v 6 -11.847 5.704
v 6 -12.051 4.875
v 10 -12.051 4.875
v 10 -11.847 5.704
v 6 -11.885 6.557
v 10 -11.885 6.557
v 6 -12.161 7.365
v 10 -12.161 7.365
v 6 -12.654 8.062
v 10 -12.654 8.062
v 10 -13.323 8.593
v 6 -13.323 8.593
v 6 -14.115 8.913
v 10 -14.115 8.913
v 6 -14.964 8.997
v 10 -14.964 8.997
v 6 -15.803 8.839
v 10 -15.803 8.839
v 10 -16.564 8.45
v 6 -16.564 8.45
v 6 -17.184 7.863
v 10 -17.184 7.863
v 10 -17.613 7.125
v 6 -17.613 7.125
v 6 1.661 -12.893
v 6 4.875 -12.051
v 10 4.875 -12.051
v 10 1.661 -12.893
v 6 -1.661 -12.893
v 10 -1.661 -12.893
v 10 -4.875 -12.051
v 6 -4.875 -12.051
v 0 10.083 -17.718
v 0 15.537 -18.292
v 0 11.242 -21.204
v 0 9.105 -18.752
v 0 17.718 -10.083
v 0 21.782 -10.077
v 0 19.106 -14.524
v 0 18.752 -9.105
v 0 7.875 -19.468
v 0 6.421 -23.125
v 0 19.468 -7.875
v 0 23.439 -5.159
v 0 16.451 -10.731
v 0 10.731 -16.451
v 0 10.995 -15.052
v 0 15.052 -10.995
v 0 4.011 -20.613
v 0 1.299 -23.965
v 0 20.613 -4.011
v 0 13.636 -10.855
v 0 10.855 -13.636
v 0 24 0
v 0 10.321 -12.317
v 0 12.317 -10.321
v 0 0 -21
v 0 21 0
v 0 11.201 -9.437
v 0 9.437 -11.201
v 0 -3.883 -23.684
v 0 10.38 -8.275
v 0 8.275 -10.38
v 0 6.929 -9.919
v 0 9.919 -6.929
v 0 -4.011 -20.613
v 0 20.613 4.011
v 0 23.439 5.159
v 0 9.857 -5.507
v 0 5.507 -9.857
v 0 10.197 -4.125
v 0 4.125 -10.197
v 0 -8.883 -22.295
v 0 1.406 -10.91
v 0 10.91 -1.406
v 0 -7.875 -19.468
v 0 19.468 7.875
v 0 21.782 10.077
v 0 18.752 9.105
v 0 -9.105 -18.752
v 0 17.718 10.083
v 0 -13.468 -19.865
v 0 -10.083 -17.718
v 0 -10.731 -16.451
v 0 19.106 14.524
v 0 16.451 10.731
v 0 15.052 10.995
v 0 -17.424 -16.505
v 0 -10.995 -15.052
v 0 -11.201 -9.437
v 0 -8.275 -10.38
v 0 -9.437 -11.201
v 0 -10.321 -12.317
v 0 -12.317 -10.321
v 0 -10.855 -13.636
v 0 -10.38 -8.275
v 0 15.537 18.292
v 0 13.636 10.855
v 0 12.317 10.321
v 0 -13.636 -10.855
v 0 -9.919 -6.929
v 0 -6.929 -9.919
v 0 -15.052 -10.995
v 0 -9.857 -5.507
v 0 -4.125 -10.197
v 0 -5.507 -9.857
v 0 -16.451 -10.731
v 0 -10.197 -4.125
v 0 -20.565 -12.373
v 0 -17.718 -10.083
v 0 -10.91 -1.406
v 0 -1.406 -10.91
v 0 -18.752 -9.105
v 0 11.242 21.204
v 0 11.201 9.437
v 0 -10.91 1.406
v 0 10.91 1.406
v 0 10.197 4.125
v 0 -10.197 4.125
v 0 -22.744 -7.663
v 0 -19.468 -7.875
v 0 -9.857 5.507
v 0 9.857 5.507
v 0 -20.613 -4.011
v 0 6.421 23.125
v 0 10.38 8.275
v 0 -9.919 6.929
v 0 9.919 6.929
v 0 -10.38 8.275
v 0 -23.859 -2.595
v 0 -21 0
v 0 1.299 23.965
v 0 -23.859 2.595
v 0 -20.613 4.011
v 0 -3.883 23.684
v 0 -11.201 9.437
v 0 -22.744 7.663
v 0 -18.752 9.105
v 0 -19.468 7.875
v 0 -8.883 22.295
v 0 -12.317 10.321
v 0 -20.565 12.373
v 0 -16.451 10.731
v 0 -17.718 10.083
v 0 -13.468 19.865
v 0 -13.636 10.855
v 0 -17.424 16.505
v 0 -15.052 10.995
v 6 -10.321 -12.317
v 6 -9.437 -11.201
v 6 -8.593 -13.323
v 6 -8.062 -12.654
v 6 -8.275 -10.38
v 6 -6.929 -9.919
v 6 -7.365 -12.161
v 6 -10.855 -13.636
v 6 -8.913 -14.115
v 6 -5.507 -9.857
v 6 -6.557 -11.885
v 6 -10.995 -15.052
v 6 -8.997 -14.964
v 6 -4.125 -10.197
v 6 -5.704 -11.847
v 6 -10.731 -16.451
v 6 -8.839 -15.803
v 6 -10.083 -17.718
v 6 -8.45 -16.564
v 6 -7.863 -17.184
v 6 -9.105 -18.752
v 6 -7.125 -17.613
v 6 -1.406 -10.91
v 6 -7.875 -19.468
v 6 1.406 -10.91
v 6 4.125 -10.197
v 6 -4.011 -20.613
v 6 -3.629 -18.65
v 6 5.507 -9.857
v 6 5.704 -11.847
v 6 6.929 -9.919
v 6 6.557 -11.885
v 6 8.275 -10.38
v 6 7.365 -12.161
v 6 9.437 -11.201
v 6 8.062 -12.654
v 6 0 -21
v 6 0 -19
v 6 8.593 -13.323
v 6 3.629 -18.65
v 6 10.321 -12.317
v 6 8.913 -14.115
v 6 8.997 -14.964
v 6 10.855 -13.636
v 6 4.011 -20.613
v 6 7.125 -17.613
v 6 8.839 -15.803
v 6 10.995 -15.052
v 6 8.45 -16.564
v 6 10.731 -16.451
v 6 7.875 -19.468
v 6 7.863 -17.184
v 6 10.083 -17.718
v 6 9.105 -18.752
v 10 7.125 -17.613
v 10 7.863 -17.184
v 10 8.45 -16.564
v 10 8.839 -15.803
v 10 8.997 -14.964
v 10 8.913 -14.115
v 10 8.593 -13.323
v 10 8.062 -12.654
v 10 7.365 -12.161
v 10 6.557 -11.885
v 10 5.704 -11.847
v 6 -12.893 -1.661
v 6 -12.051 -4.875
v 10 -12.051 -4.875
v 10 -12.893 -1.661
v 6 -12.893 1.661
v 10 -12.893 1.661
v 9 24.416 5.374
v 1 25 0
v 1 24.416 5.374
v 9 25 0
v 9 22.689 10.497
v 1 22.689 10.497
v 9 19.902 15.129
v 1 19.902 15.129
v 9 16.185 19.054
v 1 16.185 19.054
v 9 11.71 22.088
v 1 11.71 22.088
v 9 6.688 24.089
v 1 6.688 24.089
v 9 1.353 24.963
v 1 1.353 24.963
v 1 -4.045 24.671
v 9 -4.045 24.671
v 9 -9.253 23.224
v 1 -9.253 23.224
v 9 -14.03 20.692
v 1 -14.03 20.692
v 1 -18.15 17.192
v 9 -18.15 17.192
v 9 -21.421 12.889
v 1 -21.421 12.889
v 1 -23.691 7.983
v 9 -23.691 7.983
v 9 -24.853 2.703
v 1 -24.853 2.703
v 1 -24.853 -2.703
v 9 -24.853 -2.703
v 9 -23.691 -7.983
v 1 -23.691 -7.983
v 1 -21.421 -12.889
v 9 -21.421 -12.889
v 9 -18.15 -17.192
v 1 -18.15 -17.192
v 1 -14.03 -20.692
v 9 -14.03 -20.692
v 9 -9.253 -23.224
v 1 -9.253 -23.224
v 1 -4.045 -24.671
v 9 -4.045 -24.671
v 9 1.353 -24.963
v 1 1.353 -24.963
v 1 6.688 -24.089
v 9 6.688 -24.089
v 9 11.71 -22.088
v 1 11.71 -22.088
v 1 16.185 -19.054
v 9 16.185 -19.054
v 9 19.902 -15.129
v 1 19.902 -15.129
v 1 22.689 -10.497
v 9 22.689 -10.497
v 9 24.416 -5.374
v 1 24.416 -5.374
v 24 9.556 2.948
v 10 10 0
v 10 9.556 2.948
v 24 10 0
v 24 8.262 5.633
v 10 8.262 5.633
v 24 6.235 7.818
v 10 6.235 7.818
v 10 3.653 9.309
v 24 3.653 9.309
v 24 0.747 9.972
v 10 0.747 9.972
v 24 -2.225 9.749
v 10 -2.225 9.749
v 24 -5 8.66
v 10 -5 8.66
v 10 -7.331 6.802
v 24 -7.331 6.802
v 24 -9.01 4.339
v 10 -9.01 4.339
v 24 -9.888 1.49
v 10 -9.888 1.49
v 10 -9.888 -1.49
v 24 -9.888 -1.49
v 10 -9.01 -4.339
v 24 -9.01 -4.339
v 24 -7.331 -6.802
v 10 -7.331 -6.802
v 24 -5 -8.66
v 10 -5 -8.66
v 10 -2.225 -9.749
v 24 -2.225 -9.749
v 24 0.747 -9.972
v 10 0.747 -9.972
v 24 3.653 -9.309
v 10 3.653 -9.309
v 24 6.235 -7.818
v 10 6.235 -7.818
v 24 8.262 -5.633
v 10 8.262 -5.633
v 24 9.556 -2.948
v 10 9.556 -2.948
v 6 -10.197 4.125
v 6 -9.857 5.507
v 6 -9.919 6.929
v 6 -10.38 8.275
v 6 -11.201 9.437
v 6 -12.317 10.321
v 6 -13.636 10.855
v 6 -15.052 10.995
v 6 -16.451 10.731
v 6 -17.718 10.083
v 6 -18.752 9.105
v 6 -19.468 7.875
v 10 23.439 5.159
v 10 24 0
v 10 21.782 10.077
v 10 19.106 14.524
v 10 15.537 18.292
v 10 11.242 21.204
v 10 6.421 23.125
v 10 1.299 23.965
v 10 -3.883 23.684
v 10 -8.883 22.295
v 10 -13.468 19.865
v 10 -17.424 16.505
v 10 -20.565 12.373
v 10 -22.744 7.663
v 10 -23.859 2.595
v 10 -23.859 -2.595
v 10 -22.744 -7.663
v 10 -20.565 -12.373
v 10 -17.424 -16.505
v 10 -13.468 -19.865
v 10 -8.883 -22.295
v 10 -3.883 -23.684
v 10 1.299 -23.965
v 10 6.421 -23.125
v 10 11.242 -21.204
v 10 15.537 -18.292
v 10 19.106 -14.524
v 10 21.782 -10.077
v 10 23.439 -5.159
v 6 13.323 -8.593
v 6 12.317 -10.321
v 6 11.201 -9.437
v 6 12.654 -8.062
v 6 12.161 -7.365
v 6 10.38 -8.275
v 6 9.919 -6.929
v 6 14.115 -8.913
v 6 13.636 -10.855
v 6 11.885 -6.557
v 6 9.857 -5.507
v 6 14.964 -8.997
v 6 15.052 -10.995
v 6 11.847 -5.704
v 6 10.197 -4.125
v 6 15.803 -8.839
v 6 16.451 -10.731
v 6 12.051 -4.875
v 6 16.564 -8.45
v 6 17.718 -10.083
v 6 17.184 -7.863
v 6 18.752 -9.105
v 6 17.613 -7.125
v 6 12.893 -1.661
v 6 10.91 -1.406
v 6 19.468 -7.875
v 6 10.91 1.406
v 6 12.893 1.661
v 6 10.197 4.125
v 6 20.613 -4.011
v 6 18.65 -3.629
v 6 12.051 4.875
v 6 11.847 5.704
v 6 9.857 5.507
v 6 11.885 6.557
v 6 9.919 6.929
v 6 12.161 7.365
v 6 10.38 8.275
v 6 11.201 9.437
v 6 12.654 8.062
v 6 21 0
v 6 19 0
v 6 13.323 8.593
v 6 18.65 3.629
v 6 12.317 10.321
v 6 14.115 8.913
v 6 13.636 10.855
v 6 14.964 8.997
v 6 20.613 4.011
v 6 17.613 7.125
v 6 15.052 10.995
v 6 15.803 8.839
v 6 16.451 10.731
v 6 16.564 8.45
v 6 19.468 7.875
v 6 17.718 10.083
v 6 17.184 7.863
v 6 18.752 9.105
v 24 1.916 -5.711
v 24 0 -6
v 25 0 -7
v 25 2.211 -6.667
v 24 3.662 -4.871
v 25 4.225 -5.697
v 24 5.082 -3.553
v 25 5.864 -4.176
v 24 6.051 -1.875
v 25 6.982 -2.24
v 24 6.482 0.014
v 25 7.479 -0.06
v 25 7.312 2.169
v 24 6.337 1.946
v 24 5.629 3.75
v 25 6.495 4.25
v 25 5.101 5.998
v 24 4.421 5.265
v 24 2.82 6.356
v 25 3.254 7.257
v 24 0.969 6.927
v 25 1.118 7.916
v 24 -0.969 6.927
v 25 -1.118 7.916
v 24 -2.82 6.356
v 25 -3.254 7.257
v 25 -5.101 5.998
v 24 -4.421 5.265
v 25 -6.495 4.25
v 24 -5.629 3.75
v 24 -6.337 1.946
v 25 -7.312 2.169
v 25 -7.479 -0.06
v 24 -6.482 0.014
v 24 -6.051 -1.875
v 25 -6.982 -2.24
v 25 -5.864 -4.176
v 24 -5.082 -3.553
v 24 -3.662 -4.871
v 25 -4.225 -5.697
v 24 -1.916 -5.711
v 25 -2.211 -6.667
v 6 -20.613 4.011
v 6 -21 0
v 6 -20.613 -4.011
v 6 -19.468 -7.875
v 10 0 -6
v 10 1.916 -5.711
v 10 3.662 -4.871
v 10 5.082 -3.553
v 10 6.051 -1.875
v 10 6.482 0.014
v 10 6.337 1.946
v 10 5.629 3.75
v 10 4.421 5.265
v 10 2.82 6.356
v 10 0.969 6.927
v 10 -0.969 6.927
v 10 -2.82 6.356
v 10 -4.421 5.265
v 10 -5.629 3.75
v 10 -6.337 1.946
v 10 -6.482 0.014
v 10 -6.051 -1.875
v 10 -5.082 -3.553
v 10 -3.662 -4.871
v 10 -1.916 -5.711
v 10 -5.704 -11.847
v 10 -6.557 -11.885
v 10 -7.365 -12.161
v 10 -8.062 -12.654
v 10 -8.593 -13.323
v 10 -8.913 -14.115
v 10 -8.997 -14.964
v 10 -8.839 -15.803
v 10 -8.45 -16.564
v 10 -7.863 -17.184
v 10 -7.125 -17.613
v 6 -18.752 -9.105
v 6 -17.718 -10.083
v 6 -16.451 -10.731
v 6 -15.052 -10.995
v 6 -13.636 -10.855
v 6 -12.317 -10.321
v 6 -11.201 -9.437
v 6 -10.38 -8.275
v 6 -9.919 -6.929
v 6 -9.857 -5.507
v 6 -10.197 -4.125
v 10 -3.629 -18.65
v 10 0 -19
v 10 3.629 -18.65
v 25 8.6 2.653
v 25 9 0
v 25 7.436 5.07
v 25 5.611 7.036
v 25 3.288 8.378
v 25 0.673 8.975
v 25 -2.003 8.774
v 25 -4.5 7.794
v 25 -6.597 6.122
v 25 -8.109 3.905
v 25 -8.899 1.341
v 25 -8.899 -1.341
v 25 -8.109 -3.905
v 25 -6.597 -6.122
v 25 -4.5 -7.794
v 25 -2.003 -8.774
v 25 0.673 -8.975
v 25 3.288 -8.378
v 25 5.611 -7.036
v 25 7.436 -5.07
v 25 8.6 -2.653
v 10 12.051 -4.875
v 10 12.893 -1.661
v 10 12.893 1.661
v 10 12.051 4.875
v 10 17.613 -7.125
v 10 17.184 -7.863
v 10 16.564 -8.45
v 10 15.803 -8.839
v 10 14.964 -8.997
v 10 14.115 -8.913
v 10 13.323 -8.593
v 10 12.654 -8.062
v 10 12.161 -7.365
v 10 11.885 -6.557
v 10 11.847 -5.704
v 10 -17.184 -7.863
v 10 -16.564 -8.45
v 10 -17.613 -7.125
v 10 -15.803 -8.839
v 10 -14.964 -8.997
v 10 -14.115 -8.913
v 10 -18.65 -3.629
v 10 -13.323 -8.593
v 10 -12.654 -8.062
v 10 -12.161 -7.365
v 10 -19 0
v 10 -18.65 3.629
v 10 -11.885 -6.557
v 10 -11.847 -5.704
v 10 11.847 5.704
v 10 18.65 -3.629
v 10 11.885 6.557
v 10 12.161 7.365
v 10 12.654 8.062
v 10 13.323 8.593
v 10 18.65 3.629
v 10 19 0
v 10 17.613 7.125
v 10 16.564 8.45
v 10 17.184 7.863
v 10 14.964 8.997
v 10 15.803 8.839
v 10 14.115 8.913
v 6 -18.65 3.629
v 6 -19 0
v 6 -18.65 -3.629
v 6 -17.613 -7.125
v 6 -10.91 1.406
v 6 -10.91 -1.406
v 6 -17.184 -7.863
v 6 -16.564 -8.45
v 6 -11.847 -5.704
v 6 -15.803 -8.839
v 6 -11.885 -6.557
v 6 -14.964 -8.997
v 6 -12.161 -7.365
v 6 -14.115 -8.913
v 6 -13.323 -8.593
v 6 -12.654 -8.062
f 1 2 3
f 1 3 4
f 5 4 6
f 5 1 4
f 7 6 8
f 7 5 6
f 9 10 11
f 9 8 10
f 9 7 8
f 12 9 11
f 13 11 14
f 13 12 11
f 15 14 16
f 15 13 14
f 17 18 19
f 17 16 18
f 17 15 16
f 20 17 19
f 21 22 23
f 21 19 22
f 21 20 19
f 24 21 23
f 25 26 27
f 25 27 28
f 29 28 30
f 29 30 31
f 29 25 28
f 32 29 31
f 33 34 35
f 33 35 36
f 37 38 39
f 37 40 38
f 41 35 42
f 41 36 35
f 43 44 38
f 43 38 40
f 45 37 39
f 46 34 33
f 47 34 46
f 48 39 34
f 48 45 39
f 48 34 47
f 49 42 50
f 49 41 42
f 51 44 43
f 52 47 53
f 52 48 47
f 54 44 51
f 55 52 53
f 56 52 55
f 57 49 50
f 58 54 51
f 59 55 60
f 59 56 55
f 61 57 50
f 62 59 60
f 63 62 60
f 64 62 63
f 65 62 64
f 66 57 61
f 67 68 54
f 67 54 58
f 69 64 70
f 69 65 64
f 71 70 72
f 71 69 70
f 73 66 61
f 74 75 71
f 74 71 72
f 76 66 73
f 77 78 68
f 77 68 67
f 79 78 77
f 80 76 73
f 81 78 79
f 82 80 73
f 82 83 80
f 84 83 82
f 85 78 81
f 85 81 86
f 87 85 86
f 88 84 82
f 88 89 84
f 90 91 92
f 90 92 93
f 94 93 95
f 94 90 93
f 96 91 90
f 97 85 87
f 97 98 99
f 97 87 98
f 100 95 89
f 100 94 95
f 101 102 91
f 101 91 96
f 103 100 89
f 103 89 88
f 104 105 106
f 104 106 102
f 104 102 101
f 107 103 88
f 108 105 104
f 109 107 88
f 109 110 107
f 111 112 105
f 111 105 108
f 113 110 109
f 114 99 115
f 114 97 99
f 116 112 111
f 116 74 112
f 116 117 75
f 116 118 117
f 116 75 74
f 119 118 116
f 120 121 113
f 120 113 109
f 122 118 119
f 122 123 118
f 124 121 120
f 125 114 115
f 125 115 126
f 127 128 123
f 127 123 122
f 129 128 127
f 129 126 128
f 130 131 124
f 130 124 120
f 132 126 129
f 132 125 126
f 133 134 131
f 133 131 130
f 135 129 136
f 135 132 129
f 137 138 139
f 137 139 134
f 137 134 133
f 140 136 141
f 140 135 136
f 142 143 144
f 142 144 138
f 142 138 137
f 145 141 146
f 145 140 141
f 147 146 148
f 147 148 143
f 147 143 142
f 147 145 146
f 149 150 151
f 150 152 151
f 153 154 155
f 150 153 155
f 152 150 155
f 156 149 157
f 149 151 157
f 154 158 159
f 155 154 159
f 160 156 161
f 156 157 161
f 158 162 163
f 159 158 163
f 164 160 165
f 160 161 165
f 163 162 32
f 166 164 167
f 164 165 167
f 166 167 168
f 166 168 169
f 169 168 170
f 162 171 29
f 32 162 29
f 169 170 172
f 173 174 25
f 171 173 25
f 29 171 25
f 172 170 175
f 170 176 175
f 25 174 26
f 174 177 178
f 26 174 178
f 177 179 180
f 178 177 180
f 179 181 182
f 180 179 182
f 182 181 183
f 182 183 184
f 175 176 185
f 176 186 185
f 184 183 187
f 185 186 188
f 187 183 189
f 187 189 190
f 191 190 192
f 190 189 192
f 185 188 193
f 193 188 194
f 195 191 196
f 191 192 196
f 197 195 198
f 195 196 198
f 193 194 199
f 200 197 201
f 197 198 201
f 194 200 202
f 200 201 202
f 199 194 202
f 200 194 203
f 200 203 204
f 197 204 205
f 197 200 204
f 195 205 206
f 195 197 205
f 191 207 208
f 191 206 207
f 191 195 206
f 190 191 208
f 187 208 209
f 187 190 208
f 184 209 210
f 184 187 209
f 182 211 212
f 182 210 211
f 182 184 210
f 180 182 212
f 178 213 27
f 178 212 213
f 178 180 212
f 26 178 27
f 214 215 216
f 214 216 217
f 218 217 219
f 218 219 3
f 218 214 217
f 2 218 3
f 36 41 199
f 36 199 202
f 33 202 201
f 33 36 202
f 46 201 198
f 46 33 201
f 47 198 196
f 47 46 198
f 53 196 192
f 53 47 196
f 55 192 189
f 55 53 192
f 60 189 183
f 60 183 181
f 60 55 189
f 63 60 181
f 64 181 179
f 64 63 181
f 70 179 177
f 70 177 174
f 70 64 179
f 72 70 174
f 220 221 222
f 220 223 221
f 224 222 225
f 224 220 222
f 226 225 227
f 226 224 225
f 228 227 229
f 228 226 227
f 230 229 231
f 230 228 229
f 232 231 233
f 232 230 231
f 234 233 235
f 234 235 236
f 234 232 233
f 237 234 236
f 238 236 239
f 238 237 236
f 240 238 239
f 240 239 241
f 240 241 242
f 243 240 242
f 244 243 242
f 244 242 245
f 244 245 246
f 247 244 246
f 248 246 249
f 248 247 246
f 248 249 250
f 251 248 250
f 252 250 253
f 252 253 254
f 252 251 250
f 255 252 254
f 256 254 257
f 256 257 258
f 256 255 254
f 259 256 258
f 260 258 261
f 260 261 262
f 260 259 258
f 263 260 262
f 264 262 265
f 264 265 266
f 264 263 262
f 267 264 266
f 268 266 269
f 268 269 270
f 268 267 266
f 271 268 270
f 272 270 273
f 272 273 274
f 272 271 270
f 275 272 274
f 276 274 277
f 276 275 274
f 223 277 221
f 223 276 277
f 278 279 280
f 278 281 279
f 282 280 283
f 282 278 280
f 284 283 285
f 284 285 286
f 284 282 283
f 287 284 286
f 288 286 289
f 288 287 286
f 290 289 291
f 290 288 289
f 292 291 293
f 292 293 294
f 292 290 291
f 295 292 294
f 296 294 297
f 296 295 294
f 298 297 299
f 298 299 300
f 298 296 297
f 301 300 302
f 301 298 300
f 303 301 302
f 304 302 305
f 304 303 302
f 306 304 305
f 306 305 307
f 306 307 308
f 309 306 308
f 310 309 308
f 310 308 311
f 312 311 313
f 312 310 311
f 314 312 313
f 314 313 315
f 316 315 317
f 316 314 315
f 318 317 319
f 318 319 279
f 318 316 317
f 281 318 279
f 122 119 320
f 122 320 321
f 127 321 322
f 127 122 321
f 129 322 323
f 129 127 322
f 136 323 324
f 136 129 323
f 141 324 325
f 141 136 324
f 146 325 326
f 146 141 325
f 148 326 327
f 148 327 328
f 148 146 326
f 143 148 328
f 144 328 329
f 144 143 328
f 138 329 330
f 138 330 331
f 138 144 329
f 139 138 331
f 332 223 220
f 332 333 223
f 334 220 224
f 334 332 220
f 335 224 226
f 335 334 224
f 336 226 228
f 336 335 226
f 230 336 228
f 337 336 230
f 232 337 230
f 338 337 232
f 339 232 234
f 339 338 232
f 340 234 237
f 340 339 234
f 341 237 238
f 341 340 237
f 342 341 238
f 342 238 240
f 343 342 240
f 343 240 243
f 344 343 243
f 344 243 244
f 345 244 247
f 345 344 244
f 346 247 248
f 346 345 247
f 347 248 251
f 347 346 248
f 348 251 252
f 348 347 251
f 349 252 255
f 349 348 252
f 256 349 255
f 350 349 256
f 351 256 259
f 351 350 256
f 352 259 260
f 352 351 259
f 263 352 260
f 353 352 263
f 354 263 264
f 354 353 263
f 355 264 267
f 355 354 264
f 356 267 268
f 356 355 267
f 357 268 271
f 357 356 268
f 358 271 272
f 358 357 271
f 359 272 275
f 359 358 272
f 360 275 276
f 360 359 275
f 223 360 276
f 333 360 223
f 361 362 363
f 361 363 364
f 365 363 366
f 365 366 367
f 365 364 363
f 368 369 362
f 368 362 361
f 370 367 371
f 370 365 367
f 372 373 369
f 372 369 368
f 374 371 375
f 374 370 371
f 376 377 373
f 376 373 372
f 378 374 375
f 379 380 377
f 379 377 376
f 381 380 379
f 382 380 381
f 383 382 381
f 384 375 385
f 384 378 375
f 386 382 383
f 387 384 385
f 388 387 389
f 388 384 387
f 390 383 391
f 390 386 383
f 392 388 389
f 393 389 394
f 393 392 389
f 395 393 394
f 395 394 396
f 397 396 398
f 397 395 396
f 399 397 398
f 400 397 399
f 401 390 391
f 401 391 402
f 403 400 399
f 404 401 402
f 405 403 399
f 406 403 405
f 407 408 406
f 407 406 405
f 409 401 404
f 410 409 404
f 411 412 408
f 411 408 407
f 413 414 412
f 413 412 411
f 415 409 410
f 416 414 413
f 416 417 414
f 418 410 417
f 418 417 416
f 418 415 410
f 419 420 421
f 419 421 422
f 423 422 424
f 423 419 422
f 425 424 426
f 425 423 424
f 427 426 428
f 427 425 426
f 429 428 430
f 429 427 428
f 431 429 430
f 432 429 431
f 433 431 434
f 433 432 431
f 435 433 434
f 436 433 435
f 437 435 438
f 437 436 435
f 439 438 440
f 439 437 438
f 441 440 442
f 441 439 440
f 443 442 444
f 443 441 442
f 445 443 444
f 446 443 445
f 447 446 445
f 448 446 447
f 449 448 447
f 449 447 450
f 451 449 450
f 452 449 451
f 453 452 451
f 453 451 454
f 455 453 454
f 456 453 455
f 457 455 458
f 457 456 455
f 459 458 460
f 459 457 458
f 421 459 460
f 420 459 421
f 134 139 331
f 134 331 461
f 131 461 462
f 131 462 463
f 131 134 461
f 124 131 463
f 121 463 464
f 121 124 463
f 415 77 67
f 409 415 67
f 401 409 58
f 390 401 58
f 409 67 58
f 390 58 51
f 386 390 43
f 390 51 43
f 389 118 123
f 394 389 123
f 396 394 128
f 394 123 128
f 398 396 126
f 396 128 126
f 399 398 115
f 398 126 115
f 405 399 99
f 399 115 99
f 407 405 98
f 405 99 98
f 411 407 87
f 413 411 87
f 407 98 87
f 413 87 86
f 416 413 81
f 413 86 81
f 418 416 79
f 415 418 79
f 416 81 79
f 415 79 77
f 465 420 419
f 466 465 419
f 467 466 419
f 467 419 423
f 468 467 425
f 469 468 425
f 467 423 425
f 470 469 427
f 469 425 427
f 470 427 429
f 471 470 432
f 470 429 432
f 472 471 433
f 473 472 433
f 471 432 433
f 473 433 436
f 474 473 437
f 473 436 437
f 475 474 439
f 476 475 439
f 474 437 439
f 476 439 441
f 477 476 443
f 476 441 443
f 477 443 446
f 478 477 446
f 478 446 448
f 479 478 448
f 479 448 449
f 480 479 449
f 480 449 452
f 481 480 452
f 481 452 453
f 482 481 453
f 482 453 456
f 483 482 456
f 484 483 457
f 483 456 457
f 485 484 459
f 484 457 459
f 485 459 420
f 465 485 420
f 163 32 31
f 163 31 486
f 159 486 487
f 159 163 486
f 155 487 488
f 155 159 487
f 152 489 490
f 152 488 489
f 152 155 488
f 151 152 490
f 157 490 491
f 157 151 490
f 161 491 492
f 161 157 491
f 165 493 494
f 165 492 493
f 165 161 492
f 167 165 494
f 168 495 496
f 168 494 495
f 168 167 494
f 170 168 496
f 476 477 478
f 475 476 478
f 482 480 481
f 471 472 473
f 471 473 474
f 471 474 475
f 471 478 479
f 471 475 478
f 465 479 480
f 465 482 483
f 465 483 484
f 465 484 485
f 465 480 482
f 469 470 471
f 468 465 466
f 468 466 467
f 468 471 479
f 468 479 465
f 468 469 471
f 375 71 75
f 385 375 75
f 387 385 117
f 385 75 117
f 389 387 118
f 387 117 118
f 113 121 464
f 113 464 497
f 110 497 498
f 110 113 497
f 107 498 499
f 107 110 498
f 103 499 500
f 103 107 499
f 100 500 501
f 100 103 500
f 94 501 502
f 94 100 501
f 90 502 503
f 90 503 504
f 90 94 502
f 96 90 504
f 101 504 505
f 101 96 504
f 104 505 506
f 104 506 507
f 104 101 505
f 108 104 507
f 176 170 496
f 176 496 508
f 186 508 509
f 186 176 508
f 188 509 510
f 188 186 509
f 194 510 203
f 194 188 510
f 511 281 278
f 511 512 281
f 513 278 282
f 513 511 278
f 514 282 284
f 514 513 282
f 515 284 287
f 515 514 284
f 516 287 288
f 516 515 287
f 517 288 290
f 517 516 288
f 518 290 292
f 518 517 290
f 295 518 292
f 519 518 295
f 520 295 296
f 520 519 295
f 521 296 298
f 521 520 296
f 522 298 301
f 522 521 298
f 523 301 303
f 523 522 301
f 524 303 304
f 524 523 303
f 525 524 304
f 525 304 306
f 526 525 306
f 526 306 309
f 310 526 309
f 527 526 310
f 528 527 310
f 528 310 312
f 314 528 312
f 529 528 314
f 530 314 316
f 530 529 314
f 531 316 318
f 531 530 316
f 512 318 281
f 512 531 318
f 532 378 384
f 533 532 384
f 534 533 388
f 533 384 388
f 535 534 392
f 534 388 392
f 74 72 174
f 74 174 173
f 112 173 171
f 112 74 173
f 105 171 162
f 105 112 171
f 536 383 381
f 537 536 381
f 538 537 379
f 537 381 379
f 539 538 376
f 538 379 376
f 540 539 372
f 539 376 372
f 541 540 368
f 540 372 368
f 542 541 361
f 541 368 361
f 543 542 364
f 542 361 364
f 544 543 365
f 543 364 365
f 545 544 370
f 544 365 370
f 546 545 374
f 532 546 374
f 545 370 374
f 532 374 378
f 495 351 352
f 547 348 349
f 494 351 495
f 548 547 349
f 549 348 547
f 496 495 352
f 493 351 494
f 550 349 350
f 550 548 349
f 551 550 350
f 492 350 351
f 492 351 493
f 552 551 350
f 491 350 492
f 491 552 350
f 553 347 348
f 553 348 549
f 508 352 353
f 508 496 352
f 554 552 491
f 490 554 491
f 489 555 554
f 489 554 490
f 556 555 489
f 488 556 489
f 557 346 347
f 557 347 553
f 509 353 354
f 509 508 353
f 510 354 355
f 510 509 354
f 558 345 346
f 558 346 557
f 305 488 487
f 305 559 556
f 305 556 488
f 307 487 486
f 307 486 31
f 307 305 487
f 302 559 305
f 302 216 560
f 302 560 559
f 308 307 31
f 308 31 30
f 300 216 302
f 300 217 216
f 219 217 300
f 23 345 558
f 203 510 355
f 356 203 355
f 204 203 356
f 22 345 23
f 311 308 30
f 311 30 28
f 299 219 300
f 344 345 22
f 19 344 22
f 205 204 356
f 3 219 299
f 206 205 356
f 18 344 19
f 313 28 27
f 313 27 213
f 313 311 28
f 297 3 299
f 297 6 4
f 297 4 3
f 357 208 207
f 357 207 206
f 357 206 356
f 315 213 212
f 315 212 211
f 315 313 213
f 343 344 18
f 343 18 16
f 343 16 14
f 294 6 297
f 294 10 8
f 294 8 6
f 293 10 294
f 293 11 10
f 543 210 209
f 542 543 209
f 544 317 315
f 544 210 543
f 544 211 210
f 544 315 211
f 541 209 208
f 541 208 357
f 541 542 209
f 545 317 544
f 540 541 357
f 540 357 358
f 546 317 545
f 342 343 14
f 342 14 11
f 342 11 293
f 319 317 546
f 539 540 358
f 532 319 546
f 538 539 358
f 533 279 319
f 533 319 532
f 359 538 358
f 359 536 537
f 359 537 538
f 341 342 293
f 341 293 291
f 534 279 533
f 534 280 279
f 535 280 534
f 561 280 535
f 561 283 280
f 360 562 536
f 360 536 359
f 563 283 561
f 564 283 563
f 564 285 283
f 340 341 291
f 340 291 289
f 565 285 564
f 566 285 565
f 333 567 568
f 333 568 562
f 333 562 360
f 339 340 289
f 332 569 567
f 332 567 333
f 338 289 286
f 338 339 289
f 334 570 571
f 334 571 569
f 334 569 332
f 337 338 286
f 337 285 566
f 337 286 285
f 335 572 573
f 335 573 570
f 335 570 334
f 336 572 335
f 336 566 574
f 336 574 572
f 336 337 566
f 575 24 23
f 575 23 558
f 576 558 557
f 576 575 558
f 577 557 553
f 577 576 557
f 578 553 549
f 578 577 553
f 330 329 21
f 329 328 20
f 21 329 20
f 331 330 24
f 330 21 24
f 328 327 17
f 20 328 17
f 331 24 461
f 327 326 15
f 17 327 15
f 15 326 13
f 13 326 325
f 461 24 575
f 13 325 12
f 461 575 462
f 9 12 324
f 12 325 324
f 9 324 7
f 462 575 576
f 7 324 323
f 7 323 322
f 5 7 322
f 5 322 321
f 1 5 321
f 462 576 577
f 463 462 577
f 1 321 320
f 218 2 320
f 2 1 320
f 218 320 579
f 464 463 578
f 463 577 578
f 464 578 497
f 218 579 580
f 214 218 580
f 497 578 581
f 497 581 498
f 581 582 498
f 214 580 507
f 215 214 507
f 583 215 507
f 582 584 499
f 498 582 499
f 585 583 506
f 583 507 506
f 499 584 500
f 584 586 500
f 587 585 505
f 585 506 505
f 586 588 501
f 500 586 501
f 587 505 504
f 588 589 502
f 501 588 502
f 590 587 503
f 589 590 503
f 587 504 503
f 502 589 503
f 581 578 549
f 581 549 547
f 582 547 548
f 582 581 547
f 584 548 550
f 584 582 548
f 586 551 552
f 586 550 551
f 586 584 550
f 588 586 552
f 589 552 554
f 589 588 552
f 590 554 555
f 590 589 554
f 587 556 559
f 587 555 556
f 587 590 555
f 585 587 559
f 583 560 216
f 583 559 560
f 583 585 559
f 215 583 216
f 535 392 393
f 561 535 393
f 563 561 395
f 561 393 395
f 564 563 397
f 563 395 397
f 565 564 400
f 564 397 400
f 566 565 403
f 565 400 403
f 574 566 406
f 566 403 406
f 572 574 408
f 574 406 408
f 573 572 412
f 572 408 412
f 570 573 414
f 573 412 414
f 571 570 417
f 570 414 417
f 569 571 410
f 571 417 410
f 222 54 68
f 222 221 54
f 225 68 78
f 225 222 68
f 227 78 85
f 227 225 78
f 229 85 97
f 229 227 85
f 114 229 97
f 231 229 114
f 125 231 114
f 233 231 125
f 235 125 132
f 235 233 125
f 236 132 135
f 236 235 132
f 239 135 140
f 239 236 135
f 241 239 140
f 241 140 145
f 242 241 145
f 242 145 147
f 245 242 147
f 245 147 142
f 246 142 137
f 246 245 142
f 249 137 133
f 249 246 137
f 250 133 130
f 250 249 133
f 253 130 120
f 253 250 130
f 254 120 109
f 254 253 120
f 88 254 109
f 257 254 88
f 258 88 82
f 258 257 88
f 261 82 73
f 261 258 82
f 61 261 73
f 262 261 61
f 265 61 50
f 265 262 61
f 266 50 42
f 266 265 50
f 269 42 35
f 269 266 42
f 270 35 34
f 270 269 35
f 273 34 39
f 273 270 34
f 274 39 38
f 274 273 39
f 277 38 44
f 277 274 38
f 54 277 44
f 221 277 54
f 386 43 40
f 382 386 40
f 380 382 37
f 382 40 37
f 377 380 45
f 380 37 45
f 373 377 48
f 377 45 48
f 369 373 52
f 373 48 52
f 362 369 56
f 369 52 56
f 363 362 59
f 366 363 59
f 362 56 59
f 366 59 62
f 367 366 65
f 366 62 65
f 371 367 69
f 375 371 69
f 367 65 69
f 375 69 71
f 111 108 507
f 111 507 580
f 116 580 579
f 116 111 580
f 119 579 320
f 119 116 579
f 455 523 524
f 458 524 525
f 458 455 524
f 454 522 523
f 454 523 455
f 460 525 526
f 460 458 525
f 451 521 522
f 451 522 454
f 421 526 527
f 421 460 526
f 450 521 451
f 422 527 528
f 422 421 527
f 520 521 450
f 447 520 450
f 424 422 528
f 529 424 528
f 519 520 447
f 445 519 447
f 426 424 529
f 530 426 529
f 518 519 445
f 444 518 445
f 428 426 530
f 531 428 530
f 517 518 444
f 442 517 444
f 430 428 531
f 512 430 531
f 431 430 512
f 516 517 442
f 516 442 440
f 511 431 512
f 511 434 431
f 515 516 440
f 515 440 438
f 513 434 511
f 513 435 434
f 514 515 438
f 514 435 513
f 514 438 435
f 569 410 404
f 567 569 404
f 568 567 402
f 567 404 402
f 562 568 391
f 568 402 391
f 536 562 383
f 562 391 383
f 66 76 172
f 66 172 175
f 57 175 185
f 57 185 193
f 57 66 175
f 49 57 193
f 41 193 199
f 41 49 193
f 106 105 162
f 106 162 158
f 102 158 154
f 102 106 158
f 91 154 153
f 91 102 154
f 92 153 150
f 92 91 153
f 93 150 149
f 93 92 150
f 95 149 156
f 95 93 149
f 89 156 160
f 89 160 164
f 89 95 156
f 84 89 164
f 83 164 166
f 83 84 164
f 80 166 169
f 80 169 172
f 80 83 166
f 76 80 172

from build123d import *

# Parameters (mm, degrees)
CUT_EXTRUDE_2_DEPTH = 6
CUT_EXTRUDE_3_DEPTH = 26
SKETCH_3_R          = 6.5
CUT_EXTRUDE_4_DEPTH = 15
CHAMFER_1_SIZE      = 1


with BuildPart() as part:
    # Эскиз1 → Повернуть1 (revolve)
    with BuildSketch(Plane.XY):
        Polygon((0, 0), (0, 24), (1, 25), (9, 25), (10, 24), (10, 10), (24, 10), (25, 9), (25, 0), align=None)
    revolve(axis=Axis((0, 0, 0), (1, 0, 0)))

    # Эскиз4 → Вырез-Вытянуть2 (cut)
    with BuildSketch(Plane.ZY):
        with BuildLine():
            ThreePointArc((7.875, 19.467521029), (0, 21), (-7.875, 19.467521029))
            ThreePointArc((-7.875, 19.467521029), (-10.635124054, 12.957396974), (-4.125, 10.19727292))
            ThreePointArc((-4.125, 10.19727292), (0, 11), (4.125, 10.19727292))
            ThreePointArc((4.125, 10.19727292), (10.635124054, 12.957396974), (7.875, 19.467521029))
        make_face()
        with BuildLine():
            ThreePointArc((-10.19727292, 4.125), (-11, 0), (-10.19727292, -4.125))
            ThreePointArc((-10.19727292, -4.125), (-12.957396974, -10.635124054), (-19.467521029, -7.875))
            ThreePointArc((-19.467521029, -7.875), (-21, 0), (-19.467521029, 7.875))
            ThreePointArc((-19.467521029, 7.875), (-12.957396974, 10.635124054), (-10.19727292, 4.125))
        make_face()
        with BuildLine():
            ThreePointArc((-4.125, -10.19727292), (0, -11), (4.125, -10.19727292))
            ThreePointArc((4.125, -10.19727292), (10.635124054, -12.957396974), (7.875, -19.467521029))
            ThreePointArc((7.875, -19.467521029), (0, -21), (-7.875, -19.467521029))
            ThreePointArc((-7.875, -19.467521029), (-10.635124054, -12.957396974), (-4.125, -10.19727292))
        make_face()
    extrude(amount=-CUT_EXTRUDE_2_DEPTH, mode=Mode.SUBTRACT)

    # Эскиз5 → Вырез-Вытянуть3 (cut, through all)
    with BuildSketch(Plane.ZY):
        with BuildLine():
            ThreePointArc((7.125, 17.613471407), (0, 19), (-7.125, 17.613471407))
            ThreePointArc((-7.125, 17.613471407), (-8.781074433, 13.707396974), (-4.875, 12.051322542))
            ThreePointArc((-4.875, 12.051322542), (0, 13), (4.875, 12.051322542))
            ThreePointArc((4.875, 12.051322542), (8.781074433, 13.707396974), (7.125, 17.613471407))
        make_face()
        with BuildLine():
            ThreePointArc((-12.051322542, 4.875), (-13, 0), (-12.051322542, -4.875))
            ThreePointArc((-12.051322542, -4.875), (-13.707396974, -8.781074433), (-17.613471407, -7.125))
            ThreePointArc((-17.613471407, -7.125), (-19, 0), (-17.613471407, 7.125))
            ThreePointArc((-17.613471407, 7.125), (-13.707396974, 8.781074433), (-12.051322542, 4.875))
        make_face()
        with BuildLine():
            ThreePointArc((-4.875, -12.051322542), (0, -13), (4.875, -12.051322542))
            ThreePointArc((4.875, -12.051322542), (8.781074433, -13.707396974), (7.125, -17.613471407))
            ThreePointArc((7.125, -17.613471407), (0, -19), (-7.125, -17.613471407))
            ThreePointArc((-7.125, -17.613471407), (-8.781074433, -13.707396974), (-4.875, -12.051322542))
        make_face()
    extrude(amount=-CUT_EXTRUDE_3_DEPTH, mode=Mode.SUBTRACT)

    # Эскиз3 → Вырез-Вытянуть4 (cut)
    with BuildSketch(Plane(origin=(25, 0, 0), x_dir=(0, 0, -1), z_dir=(1, 0, 0))):
        with Locations((-0.5, 0)):
            Circle(SKETCH_3_R)
    extrude(amount=-CUT_EXTRUDE_4_DEPTH, mode=Mode.SUBTRACT)

    # Фаска1
    chamfer_1_edges = [part.edges().sort_by_distance(p)[0] for p in [
        (25, 0, 7),
    ]]
    chamfer(chamfer_1_edges, length=CHAMFER_1_SIZE)


solid = part.part
